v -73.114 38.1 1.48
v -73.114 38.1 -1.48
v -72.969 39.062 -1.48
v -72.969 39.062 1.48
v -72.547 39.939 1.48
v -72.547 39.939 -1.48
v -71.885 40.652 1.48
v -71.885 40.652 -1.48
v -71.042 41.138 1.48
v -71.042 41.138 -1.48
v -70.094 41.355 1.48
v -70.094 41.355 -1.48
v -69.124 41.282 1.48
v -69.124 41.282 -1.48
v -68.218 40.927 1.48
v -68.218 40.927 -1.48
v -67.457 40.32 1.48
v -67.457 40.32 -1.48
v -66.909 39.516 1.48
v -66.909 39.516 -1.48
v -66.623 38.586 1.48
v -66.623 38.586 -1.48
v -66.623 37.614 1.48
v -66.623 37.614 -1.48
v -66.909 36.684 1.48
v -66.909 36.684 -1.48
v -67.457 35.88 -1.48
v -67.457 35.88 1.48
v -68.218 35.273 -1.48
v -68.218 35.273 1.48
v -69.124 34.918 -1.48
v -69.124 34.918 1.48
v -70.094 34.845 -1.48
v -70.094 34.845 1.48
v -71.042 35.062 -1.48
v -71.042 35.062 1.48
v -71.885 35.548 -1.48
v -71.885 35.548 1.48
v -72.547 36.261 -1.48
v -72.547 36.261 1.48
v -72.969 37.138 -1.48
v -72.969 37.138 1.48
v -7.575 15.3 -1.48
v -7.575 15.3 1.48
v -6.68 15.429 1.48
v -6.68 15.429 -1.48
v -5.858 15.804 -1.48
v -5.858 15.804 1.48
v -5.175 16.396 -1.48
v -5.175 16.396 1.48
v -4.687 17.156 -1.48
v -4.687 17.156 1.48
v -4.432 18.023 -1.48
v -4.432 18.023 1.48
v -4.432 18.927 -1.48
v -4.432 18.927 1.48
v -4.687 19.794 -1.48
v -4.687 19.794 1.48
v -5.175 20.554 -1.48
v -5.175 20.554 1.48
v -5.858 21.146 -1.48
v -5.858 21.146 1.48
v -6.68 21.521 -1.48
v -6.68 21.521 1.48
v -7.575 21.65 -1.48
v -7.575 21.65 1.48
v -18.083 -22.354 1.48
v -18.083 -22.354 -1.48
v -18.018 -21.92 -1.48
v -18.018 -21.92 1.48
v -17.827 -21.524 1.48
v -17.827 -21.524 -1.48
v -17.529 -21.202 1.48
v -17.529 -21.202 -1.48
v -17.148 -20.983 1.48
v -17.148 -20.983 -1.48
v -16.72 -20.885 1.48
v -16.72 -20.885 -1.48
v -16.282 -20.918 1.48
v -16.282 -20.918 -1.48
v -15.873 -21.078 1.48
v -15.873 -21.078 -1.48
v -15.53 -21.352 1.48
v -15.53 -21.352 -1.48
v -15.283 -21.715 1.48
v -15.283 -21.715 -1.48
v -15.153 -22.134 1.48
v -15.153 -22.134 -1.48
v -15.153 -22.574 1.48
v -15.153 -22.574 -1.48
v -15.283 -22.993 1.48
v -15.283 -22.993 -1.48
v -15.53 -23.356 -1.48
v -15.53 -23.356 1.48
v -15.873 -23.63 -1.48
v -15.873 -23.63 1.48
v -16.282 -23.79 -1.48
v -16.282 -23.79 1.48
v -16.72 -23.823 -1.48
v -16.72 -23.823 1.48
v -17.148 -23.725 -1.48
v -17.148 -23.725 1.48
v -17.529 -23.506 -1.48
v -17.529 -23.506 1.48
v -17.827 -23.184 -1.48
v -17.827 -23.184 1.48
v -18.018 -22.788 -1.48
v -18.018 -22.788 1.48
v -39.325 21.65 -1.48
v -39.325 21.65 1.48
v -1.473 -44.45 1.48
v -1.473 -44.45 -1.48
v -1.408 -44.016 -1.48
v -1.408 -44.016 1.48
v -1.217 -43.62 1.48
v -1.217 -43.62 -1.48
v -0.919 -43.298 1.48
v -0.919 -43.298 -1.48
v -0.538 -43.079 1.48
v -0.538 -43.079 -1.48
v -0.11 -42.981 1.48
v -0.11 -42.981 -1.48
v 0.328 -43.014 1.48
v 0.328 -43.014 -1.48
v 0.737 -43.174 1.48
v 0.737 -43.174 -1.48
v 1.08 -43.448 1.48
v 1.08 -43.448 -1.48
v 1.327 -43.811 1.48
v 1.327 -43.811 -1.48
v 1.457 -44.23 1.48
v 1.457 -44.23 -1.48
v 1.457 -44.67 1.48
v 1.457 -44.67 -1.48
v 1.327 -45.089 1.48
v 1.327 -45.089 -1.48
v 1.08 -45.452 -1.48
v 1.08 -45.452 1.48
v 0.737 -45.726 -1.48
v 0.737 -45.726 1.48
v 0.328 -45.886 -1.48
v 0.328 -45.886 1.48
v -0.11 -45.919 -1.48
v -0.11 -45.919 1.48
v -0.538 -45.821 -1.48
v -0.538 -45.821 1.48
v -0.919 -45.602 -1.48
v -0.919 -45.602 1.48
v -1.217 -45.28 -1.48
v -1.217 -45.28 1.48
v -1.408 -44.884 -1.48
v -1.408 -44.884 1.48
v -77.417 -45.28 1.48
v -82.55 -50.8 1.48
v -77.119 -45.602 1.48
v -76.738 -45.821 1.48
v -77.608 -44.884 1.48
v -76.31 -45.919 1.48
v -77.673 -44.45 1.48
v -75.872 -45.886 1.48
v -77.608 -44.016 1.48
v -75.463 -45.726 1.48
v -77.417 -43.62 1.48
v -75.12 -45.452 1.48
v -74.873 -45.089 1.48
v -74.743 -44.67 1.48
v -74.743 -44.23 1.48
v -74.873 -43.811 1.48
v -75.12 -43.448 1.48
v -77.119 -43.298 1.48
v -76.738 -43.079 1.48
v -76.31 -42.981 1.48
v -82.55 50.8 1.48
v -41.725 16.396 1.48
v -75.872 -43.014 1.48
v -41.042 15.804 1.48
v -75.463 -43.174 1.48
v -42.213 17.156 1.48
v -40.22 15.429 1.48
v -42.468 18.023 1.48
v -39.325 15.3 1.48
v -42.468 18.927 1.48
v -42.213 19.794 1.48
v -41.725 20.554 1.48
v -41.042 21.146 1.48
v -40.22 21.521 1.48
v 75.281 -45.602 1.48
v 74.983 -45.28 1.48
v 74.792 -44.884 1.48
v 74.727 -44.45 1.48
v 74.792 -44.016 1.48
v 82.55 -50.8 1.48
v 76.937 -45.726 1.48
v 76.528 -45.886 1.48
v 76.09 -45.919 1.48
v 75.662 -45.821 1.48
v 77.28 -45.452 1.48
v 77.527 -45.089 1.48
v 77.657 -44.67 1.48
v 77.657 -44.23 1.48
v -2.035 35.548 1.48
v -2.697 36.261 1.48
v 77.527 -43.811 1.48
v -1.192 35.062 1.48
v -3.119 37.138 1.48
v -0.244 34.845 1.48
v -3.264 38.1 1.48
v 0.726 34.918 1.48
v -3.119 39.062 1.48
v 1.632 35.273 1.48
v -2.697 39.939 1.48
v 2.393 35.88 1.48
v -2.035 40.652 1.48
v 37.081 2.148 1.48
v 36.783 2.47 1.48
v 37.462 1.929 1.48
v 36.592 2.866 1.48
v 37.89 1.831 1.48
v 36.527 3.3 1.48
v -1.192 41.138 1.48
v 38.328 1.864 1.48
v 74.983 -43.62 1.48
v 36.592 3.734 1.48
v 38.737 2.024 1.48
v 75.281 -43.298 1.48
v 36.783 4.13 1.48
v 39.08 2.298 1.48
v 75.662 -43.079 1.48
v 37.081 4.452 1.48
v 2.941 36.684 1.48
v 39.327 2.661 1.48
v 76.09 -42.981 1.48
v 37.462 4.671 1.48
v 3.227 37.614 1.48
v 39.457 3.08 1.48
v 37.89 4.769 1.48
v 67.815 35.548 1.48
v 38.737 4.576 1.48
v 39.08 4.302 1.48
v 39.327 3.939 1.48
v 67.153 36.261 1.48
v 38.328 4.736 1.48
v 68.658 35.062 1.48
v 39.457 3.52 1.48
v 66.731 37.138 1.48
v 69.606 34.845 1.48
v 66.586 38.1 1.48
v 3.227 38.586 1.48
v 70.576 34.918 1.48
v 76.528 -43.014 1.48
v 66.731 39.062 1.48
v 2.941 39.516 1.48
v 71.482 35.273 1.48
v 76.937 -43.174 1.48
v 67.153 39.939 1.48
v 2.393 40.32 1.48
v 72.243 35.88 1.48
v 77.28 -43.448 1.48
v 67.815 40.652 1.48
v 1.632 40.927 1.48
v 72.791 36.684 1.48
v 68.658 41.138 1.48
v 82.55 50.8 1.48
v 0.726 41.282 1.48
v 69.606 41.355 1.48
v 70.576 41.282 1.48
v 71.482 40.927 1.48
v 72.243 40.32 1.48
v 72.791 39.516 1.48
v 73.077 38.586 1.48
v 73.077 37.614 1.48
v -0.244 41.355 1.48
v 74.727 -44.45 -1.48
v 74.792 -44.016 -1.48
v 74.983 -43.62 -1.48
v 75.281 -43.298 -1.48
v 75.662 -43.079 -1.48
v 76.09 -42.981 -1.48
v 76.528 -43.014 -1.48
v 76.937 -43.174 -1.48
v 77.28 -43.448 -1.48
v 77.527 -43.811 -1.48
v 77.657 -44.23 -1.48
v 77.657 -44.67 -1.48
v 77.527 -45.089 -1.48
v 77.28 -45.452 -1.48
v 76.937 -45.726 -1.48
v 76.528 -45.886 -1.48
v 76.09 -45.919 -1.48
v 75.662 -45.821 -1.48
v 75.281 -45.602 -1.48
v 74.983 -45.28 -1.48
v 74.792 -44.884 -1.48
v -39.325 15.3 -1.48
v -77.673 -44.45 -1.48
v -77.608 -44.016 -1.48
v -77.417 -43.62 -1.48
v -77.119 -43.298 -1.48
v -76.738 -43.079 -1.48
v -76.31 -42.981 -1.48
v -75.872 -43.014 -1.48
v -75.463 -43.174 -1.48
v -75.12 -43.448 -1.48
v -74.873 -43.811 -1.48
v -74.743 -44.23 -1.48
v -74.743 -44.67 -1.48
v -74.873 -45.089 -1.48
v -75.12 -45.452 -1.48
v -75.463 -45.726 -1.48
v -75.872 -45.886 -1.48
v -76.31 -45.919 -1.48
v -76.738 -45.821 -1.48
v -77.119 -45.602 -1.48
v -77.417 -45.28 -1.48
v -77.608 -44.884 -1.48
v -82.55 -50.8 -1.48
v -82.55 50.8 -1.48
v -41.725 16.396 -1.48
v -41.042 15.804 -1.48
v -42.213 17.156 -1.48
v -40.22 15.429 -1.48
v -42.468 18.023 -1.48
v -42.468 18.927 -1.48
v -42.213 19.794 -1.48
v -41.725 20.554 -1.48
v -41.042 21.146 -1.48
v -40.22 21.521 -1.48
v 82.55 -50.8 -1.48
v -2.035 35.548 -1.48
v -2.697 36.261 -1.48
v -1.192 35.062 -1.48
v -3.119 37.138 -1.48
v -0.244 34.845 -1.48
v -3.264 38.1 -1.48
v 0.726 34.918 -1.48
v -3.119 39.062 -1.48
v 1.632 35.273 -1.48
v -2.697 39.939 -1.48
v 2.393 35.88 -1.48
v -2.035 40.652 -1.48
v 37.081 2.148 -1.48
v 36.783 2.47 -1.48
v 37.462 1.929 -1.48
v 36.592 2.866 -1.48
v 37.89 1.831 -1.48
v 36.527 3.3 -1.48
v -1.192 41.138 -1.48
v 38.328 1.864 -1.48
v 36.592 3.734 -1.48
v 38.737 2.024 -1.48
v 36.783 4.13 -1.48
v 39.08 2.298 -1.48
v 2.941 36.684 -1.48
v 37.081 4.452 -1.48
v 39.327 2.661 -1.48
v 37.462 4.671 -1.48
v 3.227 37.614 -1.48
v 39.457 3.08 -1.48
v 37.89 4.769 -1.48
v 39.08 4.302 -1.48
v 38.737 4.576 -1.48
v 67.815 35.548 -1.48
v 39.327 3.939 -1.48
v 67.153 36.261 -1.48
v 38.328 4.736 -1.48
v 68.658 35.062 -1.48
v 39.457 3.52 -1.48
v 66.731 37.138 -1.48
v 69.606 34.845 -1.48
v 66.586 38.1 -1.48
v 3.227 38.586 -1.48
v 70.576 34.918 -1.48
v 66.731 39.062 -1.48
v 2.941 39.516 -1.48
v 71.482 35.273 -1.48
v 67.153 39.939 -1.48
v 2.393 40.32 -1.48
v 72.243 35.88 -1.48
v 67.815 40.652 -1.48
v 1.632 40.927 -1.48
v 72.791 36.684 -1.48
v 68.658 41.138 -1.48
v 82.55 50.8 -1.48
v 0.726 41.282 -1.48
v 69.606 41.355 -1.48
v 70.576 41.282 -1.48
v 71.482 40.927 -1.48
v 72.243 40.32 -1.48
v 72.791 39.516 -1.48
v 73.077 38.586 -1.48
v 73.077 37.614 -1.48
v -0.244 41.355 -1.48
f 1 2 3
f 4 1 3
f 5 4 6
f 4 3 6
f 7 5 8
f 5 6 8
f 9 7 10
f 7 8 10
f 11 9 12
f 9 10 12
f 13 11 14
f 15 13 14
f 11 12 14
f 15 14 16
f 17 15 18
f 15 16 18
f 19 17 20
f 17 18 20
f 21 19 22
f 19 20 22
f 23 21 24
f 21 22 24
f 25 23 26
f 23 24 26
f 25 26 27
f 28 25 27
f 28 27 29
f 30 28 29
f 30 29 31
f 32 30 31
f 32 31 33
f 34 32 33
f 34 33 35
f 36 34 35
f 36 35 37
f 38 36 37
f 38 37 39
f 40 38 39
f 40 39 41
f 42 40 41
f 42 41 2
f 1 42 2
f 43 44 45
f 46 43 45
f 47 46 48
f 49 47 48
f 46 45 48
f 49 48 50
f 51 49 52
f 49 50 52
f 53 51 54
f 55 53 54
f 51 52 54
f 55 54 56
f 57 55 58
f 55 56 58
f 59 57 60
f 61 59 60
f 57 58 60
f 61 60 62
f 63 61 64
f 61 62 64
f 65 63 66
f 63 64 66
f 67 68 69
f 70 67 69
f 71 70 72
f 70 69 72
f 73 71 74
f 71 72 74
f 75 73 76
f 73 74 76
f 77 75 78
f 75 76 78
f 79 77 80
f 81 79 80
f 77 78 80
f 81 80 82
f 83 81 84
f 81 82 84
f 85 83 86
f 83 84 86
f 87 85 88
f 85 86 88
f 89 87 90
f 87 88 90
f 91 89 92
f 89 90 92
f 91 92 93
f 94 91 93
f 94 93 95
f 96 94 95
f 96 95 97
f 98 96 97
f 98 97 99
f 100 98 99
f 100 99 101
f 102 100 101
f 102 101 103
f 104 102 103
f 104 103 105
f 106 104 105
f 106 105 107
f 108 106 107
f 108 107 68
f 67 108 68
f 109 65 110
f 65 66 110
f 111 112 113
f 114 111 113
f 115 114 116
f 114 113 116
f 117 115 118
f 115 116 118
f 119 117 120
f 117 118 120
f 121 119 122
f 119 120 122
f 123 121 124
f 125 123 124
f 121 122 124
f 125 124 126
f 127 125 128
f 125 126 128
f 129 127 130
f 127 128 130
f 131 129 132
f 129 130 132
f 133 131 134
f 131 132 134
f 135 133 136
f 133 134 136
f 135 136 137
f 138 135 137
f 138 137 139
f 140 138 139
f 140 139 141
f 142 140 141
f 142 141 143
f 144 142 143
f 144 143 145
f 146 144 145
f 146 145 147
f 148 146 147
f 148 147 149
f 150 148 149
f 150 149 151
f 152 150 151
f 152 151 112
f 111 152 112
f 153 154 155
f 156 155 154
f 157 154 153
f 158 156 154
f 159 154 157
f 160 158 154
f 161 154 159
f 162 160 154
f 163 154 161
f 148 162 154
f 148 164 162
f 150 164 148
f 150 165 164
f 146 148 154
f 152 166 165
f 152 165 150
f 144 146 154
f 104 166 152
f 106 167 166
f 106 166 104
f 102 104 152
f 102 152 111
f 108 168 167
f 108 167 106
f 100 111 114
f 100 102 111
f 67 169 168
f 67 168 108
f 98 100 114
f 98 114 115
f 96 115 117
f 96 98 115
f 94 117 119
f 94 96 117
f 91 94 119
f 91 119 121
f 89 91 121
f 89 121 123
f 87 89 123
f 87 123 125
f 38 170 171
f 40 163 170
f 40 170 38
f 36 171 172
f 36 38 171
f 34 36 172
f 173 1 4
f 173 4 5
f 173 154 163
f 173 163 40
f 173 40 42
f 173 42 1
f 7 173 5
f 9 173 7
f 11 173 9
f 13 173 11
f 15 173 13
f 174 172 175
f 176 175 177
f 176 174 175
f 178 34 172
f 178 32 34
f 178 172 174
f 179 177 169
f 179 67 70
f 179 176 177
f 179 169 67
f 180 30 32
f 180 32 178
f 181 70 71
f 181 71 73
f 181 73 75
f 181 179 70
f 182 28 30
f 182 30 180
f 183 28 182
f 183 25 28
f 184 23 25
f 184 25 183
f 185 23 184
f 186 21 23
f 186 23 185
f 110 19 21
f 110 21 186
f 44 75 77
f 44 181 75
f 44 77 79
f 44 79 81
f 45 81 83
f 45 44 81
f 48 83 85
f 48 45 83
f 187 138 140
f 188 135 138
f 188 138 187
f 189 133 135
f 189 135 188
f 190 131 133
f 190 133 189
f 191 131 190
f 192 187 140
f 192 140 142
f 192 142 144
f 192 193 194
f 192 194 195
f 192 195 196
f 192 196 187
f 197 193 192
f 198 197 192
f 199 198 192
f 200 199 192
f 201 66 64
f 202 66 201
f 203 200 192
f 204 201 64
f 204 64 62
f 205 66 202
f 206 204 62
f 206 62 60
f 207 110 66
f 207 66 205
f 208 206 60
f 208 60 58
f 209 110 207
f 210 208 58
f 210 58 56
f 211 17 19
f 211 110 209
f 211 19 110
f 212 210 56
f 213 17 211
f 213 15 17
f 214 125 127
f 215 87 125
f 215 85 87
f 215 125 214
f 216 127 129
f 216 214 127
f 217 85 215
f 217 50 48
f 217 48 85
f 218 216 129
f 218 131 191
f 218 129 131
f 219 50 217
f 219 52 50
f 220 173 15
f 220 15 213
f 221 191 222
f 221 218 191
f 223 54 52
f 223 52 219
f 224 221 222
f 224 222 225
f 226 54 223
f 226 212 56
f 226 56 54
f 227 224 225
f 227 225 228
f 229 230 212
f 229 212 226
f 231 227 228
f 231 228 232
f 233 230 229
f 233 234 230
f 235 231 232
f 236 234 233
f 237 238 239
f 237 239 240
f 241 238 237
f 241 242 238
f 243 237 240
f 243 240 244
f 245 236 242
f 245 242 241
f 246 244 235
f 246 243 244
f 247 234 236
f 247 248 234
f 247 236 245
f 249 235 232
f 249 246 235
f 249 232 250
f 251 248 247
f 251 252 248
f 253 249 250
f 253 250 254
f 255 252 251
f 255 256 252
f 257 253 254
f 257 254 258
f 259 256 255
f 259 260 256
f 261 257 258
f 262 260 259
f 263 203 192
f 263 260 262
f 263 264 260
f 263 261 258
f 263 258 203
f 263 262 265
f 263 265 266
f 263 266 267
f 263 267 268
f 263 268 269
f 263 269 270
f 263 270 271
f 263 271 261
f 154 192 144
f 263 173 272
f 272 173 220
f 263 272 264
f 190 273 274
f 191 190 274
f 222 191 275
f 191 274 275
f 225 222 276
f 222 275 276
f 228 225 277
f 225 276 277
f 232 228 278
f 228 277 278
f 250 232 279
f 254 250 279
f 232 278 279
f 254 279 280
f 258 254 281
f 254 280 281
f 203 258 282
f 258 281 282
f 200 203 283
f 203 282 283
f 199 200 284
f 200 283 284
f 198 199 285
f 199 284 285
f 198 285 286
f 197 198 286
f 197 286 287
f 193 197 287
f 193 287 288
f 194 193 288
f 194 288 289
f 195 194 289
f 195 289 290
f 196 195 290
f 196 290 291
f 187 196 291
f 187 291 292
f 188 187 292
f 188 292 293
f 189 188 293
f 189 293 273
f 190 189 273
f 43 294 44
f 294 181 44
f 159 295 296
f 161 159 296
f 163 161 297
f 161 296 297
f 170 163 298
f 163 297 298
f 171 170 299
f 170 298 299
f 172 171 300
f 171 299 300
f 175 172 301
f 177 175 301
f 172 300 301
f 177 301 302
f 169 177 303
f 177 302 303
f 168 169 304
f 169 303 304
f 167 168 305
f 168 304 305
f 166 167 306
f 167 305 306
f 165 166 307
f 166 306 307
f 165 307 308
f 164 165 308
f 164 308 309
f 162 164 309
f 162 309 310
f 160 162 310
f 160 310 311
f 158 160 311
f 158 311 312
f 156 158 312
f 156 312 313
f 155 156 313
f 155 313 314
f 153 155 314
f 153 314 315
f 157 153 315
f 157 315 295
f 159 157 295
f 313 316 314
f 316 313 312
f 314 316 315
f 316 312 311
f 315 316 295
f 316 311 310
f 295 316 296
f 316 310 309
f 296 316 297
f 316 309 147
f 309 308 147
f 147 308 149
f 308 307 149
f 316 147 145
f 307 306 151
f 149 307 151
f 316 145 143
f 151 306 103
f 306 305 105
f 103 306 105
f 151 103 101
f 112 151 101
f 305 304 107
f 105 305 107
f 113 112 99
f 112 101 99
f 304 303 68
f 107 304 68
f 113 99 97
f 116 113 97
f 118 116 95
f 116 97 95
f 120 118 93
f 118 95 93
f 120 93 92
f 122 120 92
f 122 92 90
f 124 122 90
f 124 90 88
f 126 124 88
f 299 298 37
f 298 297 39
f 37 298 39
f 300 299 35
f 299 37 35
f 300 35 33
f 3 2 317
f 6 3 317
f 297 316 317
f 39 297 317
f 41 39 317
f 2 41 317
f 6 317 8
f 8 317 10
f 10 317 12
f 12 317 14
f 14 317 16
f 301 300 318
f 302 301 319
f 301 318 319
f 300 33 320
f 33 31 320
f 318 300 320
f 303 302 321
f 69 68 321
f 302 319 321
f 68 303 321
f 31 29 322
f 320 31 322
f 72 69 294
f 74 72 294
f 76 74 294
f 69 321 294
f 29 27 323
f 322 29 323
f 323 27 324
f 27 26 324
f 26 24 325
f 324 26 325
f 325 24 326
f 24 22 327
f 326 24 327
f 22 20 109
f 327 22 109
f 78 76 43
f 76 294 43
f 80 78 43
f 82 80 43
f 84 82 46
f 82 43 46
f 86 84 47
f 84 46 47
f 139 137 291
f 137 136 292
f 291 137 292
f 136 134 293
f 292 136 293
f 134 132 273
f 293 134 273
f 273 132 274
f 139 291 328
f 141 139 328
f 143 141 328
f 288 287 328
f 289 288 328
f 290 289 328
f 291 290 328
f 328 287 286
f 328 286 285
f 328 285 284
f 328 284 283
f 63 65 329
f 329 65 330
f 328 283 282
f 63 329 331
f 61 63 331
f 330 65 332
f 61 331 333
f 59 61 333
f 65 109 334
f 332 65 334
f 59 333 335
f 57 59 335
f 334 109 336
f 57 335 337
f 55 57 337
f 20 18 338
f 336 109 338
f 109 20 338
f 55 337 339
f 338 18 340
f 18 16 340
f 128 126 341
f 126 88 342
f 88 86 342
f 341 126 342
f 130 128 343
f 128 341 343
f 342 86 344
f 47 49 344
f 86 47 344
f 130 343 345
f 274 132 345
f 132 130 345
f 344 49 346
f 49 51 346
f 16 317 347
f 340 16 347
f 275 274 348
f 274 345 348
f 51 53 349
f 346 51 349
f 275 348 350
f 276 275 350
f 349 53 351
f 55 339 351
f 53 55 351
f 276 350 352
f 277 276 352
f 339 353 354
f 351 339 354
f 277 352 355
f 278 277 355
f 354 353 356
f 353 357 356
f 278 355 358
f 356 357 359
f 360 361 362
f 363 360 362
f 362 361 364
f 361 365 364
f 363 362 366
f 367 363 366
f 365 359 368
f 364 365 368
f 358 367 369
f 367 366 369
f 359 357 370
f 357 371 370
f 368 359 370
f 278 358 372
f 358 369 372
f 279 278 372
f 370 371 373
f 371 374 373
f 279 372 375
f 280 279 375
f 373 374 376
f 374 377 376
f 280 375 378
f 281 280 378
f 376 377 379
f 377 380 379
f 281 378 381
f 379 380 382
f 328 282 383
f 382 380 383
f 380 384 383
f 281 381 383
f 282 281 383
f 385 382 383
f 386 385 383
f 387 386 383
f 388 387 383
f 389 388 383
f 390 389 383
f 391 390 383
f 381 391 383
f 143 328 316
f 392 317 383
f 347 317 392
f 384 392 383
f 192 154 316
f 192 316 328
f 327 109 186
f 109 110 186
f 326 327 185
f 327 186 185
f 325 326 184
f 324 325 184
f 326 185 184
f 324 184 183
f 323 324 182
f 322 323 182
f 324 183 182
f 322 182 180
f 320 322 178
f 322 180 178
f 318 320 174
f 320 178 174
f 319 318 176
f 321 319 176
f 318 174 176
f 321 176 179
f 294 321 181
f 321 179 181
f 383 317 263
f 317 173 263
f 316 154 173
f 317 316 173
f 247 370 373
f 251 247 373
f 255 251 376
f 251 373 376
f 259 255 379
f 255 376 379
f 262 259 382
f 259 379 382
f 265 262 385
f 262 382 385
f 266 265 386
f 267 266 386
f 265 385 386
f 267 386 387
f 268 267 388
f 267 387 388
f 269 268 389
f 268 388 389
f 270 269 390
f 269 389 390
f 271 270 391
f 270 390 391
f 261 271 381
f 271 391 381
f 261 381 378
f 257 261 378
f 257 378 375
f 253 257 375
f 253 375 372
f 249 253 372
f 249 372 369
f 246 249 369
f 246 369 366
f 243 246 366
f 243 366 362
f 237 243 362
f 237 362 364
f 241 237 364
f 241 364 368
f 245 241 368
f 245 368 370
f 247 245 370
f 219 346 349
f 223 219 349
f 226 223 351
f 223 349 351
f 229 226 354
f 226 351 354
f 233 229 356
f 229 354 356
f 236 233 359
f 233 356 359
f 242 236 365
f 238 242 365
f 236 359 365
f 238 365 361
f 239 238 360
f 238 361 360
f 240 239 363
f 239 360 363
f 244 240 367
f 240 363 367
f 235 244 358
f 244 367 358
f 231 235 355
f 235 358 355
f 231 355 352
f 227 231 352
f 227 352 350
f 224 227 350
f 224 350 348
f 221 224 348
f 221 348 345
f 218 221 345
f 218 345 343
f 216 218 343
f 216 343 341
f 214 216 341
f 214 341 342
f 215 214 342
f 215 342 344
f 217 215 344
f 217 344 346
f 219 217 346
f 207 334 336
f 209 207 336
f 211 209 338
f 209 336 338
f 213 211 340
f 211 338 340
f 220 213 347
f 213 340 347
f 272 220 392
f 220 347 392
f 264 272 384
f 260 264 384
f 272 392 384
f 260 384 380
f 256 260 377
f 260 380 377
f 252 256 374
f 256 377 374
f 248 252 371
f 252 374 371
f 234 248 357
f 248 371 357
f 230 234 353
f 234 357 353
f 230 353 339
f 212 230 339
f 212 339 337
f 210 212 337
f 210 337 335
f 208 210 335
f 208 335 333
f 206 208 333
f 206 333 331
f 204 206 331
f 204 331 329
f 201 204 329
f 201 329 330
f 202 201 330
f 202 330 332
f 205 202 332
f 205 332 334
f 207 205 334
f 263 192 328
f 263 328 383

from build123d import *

# Parameters (mm, degrees)
SKETCH1_W               = 165.1
SKETCH1_H               = 101.6
BOSS_EXTRUDE1_DEPTH     = 1.47955
F_1_4_CLEARANCE_HOLE1_D = 6.5278
F_4_CLEARANCE_HOLE1_D   = 2.9464


with BuildPart() as part:
    # Sketch1 → Boss-Extrude1 (new body, symmetric)
    with BuildSketch(Plane.XY):
        Rectangle(SKETCH1_W, SKETCH1_H)
        with BuildLine():
            ThreePointArc((-7.575, 15.3), (-4.4, 18.475), (-7.575, 21.65))
            Line((-7.575, 21.65), (-39.325, 21.65))
            ThreePointArc((-39.325, 21.65), (-42.5, 18.475), (-39.325, 15.3))
            Line((-39.325, 15.3), (-7.575, 15.3))
        make_face(mode=Mode.SUBTRACT)
    extrude(amount=BOSS_EXTRUDE1_DEPTH, both=True)

    # 1/4 Clearance Hole1 (through all)
    with Locations(Plane(origin=(-54.280585756, -28.309576901, 1.47955), x_dir=(1, 0, 0), z_dir=(0, 0, 1))):
        with Locations((-15.569414244, 66.409576901), (124.130585756, 66.409576901), (54.280585756, 66.409576901)):
            Hole(F_1_4_CLEARANCE_HOLE1_D / 2)

    # #4 Clearance Hole1 (through all)
    with Locations(Plane(origin=(-67.931660522, 13.630291587, 1.47955), x_dir=(1, 0, 0), z_dir=(0, 0, 1))):
        with Locations((105.931660522, -10.330291587), (51.321660522, -35.984291587), (-8.268339478, -58.080291587), (144.131660522, -58.080291587), (67.931660522, -58.080291587)):
            Hole(F_4_CLEARANCE_HOLE1_D / 2)


solid = part.part
